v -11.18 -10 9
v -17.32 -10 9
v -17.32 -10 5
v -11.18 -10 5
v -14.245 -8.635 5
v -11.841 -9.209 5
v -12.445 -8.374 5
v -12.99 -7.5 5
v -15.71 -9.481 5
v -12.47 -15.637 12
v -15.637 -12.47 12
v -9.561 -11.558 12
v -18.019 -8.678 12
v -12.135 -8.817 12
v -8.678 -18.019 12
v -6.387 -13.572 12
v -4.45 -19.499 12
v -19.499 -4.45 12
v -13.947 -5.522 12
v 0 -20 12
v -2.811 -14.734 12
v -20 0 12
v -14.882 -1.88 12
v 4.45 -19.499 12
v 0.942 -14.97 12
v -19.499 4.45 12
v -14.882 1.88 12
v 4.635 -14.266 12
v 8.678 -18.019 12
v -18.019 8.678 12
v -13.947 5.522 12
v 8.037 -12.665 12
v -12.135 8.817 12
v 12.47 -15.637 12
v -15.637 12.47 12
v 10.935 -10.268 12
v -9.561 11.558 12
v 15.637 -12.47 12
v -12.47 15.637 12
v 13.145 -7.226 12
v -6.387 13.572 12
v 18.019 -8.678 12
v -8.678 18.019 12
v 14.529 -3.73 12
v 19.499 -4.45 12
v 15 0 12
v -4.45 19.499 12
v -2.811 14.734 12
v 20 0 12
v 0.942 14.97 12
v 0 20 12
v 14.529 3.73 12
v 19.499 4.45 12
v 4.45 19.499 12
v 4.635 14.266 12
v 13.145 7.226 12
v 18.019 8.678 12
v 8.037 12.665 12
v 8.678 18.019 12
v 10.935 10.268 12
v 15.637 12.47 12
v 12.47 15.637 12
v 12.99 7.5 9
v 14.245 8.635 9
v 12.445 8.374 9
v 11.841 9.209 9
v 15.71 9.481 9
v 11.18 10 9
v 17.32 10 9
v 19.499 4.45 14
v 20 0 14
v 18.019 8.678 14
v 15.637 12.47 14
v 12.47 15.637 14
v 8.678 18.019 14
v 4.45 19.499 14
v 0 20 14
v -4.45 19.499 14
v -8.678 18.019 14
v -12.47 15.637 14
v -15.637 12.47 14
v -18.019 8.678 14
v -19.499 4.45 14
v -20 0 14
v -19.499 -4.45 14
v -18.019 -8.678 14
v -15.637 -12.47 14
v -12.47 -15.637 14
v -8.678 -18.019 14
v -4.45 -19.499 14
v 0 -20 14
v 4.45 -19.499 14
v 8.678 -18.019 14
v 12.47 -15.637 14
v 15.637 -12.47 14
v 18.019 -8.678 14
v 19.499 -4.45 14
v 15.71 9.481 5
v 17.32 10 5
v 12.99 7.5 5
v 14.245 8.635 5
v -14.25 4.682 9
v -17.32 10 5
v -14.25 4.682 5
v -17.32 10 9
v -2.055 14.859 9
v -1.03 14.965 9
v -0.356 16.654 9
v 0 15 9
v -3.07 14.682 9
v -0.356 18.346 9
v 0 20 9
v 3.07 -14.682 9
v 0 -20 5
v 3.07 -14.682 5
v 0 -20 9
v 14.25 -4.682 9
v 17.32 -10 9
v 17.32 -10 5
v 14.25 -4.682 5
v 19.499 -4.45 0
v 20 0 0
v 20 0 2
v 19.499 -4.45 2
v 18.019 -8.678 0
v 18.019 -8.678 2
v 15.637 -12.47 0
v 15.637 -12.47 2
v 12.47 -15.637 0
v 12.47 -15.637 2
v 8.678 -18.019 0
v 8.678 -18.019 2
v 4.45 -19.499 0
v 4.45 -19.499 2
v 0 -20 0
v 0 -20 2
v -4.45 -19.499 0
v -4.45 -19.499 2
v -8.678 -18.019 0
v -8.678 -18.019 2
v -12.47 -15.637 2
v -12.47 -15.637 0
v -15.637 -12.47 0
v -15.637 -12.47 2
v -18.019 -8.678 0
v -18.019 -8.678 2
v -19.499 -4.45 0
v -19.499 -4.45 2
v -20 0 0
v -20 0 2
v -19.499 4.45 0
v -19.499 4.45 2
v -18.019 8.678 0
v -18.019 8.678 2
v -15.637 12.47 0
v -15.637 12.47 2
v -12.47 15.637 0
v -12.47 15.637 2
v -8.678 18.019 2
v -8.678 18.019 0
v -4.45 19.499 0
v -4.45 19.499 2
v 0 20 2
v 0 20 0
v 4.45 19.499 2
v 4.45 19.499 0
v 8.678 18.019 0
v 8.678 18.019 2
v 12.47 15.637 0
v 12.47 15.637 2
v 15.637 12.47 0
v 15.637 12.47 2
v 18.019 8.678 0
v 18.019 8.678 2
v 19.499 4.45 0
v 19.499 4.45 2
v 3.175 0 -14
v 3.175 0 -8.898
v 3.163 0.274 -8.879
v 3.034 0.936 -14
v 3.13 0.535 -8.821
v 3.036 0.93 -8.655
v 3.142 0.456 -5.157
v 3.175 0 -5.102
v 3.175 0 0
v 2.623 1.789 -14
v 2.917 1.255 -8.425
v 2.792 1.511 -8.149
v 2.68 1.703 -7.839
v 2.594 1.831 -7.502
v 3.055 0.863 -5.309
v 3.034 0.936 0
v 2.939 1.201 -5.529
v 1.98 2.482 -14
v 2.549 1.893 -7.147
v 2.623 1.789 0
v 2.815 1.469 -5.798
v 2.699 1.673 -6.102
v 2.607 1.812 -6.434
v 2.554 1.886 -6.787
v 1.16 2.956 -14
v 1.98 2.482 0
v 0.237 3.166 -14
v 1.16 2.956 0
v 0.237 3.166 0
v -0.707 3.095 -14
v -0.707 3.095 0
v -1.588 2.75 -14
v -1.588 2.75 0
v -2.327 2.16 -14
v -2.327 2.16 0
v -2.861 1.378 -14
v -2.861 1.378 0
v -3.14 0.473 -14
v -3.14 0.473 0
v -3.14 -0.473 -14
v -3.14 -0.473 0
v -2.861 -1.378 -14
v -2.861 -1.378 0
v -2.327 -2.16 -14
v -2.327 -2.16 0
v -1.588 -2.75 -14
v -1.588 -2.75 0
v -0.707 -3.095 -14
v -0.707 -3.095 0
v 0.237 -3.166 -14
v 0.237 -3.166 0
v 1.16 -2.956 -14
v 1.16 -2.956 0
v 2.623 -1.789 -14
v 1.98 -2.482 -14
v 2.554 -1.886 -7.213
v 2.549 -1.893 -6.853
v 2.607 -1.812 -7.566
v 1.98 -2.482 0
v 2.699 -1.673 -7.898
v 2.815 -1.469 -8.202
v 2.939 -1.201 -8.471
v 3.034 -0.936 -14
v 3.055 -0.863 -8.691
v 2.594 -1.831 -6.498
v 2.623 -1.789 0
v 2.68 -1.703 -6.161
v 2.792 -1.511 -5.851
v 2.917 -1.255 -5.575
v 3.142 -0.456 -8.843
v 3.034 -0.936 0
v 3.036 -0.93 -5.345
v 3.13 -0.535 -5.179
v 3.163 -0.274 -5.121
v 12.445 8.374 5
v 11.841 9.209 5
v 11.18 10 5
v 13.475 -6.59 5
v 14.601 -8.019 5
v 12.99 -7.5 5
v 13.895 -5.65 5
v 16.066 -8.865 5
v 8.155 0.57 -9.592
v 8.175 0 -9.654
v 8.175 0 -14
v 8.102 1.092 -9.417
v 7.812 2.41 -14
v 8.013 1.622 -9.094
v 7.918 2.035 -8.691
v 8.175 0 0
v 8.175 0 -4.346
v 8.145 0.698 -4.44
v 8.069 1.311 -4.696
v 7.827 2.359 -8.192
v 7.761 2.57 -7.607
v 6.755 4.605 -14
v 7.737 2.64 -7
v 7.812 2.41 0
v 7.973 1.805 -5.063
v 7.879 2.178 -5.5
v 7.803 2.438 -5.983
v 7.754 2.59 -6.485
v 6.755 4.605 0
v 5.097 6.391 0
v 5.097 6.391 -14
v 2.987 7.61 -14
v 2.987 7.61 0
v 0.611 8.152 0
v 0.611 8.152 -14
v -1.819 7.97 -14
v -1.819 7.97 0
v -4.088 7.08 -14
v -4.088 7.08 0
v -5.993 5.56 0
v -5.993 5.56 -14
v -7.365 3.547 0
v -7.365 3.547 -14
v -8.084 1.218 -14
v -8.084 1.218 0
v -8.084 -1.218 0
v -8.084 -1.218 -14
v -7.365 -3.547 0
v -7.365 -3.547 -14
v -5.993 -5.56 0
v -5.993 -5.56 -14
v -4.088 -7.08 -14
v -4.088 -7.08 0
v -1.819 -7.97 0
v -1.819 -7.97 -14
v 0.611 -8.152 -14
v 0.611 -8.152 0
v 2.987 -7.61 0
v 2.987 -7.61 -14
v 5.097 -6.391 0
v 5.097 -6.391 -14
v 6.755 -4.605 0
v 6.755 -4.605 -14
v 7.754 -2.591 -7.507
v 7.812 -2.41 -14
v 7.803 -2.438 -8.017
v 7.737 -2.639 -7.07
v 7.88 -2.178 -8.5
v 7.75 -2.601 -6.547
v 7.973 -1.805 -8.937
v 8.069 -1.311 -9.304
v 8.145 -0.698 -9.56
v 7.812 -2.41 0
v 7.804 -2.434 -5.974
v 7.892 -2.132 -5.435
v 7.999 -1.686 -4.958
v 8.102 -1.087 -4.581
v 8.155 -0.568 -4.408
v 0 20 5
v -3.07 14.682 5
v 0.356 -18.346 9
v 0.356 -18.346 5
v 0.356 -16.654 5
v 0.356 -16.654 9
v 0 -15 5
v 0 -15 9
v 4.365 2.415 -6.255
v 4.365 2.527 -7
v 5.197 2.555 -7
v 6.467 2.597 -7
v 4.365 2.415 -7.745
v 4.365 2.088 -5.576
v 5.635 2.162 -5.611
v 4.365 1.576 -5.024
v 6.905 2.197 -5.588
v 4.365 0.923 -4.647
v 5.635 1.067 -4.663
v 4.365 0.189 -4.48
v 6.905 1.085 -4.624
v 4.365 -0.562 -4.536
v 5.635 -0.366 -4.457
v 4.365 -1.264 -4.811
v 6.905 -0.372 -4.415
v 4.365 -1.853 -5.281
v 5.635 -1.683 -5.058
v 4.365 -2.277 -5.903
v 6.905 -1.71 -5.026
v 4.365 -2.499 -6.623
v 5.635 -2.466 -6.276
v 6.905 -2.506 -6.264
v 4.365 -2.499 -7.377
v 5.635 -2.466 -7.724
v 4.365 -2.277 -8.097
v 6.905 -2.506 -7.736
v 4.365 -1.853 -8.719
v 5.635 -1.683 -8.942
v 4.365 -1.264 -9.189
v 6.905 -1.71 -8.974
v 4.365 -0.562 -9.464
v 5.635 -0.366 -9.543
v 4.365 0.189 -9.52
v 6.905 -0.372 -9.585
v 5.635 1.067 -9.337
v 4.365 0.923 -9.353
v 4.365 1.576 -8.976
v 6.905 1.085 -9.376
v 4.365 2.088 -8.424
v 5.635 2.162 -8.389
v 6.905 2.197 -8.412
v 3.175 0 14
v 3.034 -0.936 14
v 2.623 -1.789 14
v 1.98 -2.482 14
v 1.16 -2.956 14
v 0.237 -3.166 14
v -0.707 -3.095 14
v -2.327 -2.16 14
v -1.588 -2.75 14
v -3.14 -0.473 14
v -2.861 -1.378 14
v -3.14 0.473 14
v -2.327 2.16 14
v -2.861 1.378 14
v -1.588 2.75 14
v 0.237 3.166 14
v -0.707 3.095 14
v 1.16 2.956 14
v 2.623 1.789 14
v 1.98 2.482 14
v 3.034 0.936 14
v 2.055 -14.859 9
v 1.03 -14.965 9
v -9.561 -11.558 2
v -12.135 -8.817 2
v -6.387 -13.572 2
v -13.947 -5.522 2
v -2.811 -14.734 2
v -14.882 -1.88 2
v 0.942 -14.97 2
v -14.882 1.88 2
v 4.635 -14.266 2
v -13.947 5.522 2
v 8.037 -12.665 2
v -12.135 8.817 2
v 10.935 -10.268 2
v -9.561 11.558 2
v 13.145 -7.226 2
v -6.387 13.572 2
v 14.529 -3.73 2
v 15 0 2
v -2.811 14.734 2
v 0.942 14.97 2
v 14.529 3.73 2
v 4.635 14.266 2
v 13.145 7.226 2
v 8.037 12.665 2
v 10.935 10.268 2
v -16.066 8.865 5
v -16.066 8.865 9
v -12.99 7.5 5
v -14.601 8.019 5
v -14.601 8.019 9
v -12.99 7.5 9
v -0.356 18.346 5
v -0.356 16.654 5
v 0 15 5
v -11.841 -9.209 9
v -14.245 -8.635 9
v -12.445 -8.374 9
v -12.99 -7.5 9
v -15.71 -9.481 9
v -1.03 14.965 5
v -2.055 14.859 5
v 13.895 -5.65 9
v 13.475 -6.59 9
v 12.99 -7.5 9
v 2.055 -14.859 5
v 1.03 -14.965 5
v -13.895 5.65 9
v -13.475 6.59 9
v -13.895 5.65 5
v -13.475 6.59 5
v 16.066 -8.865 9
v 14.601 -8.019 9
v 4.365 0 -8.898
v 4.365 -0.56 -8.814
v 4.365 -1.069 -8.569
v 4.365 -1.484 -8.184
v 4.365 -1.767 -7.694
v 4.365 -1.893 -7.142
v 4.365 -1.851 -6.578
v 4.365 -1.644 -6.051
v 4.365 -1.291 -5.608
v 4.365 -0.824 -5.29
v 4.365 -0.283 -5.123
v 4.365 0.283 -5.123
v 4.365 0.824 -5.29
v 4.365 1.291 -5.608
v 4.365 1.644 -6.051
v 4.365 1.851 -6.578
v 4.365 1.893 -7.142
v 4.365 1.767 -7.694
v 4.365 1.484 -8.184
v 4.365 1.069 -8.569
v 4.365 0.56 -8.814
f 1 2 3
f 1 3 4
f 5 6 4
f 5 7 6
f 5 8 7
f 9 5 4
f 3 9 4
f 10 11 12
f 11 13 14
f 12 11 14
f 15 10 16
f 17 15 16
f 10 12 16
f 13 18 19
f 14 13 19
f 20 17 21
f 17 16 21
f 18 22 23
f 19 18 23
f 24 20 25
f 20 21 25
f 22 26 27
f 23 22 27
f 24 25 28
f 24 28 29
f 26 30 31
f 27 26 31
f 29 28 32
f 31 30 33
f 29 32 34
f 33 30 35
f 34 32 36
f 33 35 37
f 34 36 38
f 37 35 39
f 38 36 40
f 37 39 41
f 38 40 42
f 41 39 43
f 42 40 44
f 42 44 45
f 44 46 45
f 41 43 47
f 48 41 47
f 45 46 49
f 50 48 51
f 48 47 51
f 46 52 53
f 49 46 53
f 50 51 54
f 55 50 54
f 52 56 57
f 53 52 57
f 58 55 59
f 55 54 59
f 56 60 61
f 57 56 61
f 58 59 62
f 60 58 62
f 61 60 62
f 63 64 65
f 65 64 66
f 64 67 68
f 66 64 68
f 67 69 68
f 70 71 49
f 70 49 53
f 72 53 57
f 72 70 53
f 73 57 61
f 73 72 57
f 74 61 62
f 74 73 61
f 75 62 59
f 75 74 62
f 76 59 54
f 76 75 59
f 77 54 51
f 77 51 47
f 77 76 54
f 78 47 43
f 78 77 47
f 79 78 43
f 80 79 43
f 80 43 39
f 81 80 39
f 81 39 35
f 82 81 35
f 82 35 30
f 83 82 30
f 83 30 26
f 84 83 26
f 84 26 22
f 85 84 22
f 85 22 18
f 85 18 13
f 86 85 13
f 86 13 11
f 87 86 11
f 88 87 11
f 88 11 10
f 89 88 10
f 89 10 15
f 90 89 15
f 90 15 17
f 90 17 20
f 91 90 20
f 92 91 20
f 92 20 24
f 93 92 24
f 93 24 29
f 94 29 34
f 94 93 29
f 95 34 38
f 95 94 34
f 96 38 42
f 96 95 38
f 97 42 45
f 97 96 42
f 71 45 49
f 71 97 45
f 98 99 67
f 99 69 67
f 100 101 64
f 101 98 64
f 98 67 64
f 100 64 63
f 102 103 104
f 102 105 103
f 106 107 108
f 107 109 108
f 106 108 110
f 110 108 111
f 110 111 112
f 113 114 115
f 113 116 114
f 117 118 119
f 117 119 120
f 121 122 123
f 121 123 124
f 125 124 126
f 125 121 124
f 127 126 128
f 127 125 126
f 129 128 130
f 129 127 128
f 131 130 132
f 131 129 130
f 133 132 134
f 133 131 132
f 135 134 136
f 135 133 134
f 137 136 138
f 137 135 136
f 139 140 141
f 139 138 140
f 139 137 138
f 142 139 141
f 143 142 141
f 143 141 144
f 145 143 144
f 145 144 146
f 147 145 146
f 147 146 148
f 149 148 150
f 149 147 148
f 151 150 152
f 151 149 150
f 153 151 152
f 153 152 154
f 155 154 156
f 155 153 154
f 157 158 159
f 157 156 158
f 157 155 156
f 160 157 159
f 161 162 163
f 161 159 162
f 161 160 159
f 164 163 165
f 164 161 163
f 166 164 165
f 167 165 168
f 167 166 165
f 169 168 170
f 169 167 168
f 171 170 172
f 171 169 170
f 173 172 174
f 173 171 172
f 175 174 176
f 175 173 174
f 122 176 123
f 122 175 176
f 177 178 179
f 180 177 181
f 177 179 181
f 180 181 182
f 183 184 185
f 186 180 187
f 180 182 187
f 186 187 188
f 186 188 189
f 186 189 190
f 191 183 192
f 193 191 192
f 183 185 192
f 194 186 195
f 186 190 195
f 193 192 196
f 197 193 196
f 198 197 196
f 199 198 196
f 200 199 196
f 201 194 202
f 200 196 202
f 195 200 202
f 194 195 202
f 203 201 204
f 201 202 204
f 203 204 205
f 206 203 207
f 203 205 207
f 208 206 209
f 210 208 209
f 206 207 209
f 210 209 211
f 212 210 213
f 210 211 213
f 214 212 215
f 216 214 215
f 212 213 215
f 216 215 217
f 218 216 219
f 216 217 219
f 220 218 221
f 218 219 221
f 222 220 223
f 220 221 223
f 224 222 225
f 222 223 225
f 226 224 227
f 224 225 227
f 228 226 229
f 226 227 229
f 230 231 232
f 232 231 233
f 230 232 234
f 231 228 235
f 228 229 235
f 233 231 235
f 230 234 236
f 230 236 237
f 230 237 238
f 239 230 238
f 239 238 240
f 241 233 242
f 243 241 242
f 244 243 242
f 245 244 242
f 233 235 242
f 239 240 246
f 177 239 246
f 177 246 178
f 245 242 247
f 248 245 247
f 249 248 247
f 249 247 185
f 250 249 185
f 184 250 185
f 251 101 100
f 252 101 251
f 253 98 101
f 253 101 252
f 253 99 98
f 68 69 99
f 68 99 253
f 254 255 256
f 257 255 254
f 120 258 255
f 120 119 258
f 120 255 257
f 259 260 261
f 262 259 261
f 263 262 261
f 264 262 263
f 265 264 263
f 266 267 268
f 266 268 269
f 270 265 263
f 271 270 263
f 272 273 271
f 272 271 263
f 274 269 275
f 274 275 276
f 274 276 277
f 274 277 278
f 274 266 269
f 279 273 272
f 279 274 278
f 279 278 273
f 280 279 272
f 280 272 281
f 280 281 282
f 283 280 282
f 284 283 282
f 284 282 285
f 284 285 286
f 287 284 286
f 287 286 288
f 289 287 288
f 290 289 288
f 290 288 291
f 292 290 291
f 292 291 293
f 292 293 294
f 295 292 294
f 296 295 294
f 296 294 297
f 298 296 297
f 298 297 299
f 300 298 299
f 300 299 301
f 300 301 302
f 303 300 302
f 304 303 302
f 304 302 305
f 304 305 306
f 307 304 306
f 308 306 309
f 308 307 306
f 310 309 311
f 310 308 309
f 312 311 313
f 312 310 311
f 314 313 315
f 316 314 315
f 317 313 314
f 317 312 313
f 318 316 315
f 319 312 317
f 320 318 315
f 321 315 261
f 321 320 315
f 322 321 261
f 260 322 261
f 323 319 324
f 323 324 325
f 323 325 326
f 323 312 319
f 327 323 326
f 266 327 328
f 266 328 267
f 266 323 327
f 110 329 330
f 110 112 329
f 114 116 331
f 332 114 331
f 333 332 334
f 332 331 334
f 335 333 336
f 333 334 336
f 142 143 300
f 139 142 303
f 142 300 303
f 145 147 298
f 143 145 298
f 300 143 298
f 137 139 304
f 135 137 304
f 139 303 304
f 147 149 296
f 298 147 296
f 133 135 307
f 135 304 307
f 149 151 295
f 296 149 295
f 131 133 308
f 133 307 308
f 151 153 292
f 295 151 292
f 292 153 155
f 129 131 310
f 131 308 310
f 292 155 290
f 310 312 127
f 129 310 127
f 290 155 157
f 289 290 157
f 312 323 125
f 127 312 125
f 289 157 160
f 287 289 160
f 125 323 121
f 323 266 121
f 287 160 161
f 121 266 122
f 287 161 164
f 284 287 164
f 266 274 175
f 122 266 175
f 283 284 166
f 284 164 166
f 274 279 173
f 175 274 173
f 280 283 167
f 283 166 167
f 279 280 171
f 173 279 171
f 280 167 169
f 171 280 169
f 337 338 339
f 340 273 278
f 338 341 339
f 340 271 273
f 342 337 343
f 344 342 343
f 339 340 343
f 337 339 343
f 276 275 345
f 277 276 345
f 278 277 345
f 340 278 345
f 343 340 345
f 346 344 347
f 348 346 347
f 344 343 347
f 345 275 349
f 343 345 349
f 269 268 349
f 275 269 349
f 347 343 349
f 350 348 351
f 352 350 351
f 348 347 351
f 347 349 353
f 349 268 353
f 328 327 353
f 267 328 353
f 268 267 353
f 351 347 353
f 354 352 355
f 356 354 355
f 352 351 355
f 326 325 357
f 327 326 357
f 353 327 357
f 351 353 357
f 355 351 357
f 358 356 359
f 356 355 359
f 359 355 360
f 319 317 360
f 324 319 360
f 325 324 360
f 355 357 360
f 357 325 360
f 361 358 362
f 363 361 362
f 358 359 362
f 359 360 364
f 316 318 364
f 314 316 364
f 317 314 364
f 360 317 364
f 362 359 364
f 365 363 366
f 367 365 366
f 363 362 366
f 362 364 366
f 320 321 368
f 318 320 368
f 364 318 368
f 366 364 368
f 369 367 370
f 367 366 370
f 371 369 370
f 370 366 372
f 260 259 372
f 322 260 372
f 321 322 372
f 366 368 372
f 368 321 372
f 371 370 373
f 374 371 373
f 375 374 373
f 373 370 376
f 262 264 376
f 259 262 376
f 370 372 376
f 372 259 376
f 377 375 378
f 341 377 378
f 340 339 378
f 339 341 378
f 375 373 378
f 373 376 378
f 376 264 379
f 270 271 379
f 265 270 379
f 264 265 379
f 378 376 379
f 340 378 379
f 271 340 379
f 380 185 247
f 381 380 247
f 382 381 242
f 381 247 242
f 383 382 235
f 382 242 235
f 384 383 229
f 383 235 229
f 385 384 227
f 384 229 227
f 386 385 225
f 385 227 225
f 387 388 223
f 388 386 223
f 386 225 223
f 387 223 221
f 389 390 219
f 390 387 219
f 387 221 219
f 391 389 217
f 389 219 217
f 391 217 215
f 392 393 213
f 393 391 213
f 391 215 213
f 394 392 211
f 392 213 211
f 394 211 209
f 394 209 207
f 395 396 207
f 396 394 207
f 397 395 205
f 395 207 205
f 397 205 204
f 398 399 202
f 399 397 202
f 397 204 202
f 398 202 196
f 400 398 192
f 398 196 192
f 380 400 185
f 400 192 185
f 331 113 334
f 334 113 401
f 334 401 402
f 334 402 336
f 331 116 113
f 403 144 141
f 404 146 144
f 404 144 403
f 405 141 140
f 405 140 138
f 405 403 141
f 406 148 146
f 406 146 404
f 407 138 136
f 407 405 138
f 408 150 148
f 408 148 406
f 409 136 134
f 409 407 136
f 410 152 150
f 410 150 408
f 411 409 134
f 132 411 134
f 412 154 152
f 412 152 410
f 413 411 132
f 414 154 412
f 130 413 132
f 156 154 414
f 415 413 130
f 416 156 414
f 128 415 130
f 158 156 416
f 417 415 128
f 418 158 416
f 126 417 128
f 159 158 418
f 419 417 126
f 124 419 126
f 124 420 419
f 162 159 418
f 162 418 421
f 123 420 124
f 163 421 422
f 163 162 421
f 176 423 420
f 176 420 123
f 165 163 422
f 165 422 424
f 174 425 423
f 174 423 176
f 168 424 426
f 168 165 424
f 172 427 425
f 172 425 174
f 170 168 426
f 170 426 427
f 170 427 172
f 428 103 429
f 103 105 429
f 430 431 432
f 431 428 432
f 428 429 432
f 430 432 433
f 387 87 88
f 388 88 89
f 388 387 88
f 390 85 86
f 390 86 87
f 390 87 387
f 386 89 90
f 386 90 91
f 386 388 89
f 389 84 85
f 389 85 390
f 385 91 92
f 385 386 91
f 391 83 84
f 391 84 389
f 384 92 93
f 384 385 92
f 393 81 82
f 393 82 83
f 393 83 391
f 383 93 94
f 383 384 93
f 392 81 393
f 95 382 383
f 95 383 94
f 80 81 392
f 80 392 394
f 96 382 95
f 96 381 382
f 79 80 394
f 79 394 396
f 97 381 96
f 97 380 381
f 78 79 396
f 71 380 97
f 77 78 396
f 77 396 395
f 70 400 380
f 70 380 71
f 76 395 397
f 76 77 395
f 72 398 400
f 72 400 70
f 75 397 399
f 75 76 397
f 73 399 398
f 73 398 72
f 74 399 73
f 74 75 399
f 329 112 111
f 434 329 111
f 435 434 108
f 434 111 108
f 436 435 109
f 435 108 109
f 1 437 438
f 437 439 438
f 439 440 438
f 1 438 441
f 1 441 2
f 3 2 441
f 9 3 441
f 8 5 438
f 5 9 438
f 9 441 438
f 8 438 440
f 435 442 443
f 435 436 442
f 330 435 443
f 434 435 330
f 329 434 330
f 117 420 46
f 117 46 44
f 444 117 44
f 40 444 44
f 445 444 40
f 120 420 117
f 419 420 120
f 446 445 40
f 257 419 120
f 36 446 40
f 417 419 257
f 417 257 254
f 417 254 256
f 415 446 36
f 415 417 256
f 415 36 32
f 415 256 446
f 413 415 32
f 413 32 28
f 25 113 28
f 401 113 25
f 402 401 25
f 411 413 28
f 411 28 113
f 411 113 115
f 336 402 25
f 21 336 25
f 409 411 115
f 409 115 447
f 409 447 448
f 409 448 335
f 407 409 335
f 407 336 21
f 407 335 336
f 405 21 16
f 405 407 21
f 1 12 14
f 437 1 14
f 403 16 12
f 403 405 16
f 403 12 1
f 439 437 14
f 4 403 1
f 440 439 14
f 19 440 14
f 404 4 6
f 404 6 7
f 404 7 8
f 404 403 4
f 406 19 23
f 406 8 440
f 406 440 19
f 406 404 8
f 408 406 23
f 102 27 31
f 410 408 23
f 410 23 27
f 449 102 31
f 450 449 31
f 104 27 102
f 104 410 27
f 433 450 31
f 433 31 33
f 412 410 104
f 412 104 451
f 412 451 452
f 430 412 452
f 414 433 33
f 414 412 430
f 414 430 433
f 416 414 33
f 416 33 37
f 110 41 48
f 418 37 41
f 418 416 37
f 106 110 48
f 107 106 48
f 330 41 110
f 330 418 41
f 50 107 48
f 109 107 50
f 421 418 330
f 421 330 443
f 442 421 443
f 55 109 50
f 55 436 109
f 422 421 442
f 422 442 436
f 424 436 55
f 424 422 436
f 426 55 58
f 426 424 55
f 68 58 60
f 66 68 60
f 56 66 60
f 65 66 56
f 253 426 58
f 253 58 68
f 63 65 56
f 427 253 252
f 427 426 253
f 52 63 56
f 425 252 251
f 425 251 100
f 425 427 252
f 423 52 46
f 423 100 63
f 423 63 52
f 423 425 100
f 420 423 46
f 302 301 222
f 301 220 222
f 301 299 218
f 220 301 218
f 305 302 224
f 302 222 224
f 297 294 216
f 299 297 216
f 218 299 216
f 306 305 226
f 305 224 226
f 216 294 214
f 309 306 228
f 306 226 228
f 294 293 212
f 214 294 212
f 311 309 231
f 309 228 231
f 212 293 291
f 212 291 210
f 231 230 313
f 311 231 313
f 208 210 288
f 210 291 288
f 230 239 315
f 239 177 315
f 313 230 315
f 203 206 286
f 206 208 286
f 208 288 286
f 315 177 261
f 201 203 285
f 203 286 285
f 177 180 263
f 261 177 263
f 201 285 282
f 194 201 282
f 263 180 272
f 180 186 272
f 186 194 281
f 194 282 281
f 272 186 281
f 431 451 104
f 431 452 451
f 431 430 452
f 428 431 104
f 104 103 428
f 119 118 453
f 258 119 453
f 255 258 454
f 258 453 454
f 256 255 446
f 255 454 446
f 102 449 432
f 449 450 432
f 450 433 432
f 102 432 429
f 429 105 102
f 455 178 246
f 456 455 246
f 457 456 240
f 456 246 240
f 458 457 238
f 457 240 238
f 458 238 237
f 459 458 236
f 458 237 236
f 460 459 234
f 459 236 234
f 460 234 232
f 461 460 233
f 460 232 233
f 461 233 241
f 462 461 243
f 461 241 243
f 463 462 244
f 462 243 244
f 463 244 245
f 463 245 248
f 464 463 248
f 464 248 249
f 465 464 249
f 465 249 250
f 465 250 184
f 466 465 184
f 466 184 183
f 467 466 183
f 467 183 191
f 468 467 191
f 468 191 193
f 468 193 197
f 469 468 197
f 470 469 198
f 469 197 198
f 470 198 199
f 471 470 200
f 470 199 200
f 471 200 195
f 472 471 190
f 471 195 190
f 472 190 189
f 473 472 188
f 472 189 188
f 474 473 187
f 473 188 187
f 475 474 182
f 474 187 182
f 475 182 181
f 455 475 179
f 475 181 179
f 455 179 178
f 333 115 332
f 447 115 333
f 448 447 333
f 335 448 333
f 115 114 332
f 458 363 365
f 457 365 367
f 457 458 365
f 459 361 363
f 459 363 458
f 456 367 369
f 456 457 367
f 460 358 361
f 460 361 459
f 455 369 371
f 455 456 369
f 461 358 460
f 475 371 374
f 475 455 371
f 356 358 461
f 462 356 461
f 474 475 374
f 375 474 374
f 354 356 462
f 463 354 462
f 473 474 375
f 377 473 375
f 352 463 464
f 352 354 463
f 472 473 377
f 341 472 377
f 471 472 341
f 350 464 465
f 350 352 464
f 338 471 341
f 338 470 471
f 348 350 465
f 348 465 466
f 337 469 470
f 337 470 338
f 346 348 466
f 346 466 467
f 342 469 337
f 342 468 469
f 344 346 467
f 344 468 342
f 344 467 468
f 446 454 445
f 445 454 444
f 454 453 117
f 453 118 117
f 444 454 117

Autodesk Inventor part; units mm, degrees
ref_plane "XZ Plane" through (0, 0, 0) normal (0, 1, 0) x (-1, 0, 0)
sketch "Sketch1" plane through (0, 0, 0) normal (0, 0, 1) x (1, 0, 0)
  circle A0 centre (0, 0) radius 15
  circle A1 centre (0, 0) radius 20
  circle A2 centre (0, 0) radius 3.175
  circle A3 centre (0, 0) radius 8.175
  dimension "d18" = 6.35
  dimension "d19" = 16.35
  dimension "d40" = 30
  dimension "d41" = 5
extrude "Extrusion1" add sketch "Sketch1" along normal blind 14 contours A0 | A2 | A3
extrude "Extrusion2" add sketch "Sketch1" along normal blind 2 contours A1
sketch "Sketch2" plane through (0, 0, 14) normal (0, 0, 1) x (1, 0, 0)
  circle A0 centre (0, 0) radius 15 projected
  circle A1 centre (0, 0) radius 20 projected
extrude "Extrusion3" add sketch "Sketch2" against normal blind 2
ref_plane "Work Plane1" through (0, 0, 7) normal (0, 0, -1) x (-1, 0, 0)
extrude "Extrusion5" cut sketch "Sketch1" along normal up to surface (14 mm away) contours A2
extrude "Extrusion6" add sketch "Sketch1" against normal blind 14 contours A3
ref_plane "Work Plane2" through (8.175, 0, 0) normal (1, 0, 0) x (0, 1, 0)
sketch "Sketch9" plane through (0, 0, 7) normal (0, 0, -1) x (-1, 0, 0)
  circle A0 centre (0, 0) radius 15 projected
  line L0 (0, -15) -> (0, -20) construction
  circle A1 centre (0, 0) radius 20 projected
  arc A2 (0, -15) -> (0, -20) centre (7.5993, -17.5) ccw
  line L1 (0, -20) -> (-3.0701, -14.6825)
  circle A3 centre (0, 0) radius 15
  line L2 (12.9904, -7.5) -> (17.3205, -10) construction
  line L3 (17.3205, -10) -> (11.1803, -10)
  arc A4 (12.9904, -7.5) -> (17.3205, -10) centre (18.9551, -2.1688) ccw
  line L4 (12.9904, 7.5) -> (17.3205, 10) construction
  line L5 (17.3205, 10) -> (14.2504, 4.6825)
  arc A5 (12.9904, 7.5) -> (17.3205, 10) centre (11.3558, 15.3312) ccw
  line L6 (0, 15) -> (0, 20) construction
  line L7 (0, 20) -> (3.0701, 14.6825)
  arc A6 (0, 15) -> (0, 20) centre (-7.5993, 17.5) ccw
  line L8 (-12.9904, 7.5) -> (-17.3205, 10) construction
  line L9 (-17.3205, 10) -> (-11.1803, 10)
  arc A7 (-12.9904, 7.5) -> (-17.3205, 10) centre (-18.9551, 2.1688) ccw
  line L10 (-12.9904, -7.5) -> (-17.3205, -10) construction
  line L11 (-17.3205, -10) -> (-14.2504, -4.6825)
  arc A8 (-12.9904, -7.5) -> (-17.3205, -10) centre (-11.3558, -15.3312) ccw
  point P0 (0, -17.5)
  point P1 (15.1554, -8.75)
  point P2 (15.1554, 8.75)
  point P3 (0, 17.5)
  point P4 (-15.1554, 8.75)
  point P5 (-15.1554, -8.75)
  dimension "d58" = 8
  dimension "d59" = 30
  dimension "d62" = 360
extrude "Extrusion9" add sketch "Sketch9" along normal mid plane 4 contours A0 A5 L5 | A4 L3 A0 | A0 A6 L7 | A2 L1 A0 | L9 A0 A7 | L11 A0 A8
sketch "Sketch10" plane through (8.175, 0, 0) normal (1, 0, 0) x (0, 1, 0)
  line L0 (0, 0) -> (0, -14) construction
  line L1 (3.175, -14) -> (-3.175, -14) construction
  circle A0 centre (0, -7) radius 2.6543
  circle A1 centre (0, -7) radius 2.5273
  dimension "d67" = 5.3086
  dimension "d68" = 5.0546
extrude "Extrusion10" cut sketch "Sketch10" against normal blind 3.81 contours A1
loft "Loft1" cut profiles "Sketch10" section 2 edges at (4.365, -2.5273, -7) contours A0 | A1
hole "Hole2" at (8.175, 0, -7) direction (-1, 0, 0) diameter 3.797 end up to surface clearance for "Flat Head Machine Screw (82)" size "#6" standard "Ansi Unified Screw Threads"
properties part number "leverSpindle"
